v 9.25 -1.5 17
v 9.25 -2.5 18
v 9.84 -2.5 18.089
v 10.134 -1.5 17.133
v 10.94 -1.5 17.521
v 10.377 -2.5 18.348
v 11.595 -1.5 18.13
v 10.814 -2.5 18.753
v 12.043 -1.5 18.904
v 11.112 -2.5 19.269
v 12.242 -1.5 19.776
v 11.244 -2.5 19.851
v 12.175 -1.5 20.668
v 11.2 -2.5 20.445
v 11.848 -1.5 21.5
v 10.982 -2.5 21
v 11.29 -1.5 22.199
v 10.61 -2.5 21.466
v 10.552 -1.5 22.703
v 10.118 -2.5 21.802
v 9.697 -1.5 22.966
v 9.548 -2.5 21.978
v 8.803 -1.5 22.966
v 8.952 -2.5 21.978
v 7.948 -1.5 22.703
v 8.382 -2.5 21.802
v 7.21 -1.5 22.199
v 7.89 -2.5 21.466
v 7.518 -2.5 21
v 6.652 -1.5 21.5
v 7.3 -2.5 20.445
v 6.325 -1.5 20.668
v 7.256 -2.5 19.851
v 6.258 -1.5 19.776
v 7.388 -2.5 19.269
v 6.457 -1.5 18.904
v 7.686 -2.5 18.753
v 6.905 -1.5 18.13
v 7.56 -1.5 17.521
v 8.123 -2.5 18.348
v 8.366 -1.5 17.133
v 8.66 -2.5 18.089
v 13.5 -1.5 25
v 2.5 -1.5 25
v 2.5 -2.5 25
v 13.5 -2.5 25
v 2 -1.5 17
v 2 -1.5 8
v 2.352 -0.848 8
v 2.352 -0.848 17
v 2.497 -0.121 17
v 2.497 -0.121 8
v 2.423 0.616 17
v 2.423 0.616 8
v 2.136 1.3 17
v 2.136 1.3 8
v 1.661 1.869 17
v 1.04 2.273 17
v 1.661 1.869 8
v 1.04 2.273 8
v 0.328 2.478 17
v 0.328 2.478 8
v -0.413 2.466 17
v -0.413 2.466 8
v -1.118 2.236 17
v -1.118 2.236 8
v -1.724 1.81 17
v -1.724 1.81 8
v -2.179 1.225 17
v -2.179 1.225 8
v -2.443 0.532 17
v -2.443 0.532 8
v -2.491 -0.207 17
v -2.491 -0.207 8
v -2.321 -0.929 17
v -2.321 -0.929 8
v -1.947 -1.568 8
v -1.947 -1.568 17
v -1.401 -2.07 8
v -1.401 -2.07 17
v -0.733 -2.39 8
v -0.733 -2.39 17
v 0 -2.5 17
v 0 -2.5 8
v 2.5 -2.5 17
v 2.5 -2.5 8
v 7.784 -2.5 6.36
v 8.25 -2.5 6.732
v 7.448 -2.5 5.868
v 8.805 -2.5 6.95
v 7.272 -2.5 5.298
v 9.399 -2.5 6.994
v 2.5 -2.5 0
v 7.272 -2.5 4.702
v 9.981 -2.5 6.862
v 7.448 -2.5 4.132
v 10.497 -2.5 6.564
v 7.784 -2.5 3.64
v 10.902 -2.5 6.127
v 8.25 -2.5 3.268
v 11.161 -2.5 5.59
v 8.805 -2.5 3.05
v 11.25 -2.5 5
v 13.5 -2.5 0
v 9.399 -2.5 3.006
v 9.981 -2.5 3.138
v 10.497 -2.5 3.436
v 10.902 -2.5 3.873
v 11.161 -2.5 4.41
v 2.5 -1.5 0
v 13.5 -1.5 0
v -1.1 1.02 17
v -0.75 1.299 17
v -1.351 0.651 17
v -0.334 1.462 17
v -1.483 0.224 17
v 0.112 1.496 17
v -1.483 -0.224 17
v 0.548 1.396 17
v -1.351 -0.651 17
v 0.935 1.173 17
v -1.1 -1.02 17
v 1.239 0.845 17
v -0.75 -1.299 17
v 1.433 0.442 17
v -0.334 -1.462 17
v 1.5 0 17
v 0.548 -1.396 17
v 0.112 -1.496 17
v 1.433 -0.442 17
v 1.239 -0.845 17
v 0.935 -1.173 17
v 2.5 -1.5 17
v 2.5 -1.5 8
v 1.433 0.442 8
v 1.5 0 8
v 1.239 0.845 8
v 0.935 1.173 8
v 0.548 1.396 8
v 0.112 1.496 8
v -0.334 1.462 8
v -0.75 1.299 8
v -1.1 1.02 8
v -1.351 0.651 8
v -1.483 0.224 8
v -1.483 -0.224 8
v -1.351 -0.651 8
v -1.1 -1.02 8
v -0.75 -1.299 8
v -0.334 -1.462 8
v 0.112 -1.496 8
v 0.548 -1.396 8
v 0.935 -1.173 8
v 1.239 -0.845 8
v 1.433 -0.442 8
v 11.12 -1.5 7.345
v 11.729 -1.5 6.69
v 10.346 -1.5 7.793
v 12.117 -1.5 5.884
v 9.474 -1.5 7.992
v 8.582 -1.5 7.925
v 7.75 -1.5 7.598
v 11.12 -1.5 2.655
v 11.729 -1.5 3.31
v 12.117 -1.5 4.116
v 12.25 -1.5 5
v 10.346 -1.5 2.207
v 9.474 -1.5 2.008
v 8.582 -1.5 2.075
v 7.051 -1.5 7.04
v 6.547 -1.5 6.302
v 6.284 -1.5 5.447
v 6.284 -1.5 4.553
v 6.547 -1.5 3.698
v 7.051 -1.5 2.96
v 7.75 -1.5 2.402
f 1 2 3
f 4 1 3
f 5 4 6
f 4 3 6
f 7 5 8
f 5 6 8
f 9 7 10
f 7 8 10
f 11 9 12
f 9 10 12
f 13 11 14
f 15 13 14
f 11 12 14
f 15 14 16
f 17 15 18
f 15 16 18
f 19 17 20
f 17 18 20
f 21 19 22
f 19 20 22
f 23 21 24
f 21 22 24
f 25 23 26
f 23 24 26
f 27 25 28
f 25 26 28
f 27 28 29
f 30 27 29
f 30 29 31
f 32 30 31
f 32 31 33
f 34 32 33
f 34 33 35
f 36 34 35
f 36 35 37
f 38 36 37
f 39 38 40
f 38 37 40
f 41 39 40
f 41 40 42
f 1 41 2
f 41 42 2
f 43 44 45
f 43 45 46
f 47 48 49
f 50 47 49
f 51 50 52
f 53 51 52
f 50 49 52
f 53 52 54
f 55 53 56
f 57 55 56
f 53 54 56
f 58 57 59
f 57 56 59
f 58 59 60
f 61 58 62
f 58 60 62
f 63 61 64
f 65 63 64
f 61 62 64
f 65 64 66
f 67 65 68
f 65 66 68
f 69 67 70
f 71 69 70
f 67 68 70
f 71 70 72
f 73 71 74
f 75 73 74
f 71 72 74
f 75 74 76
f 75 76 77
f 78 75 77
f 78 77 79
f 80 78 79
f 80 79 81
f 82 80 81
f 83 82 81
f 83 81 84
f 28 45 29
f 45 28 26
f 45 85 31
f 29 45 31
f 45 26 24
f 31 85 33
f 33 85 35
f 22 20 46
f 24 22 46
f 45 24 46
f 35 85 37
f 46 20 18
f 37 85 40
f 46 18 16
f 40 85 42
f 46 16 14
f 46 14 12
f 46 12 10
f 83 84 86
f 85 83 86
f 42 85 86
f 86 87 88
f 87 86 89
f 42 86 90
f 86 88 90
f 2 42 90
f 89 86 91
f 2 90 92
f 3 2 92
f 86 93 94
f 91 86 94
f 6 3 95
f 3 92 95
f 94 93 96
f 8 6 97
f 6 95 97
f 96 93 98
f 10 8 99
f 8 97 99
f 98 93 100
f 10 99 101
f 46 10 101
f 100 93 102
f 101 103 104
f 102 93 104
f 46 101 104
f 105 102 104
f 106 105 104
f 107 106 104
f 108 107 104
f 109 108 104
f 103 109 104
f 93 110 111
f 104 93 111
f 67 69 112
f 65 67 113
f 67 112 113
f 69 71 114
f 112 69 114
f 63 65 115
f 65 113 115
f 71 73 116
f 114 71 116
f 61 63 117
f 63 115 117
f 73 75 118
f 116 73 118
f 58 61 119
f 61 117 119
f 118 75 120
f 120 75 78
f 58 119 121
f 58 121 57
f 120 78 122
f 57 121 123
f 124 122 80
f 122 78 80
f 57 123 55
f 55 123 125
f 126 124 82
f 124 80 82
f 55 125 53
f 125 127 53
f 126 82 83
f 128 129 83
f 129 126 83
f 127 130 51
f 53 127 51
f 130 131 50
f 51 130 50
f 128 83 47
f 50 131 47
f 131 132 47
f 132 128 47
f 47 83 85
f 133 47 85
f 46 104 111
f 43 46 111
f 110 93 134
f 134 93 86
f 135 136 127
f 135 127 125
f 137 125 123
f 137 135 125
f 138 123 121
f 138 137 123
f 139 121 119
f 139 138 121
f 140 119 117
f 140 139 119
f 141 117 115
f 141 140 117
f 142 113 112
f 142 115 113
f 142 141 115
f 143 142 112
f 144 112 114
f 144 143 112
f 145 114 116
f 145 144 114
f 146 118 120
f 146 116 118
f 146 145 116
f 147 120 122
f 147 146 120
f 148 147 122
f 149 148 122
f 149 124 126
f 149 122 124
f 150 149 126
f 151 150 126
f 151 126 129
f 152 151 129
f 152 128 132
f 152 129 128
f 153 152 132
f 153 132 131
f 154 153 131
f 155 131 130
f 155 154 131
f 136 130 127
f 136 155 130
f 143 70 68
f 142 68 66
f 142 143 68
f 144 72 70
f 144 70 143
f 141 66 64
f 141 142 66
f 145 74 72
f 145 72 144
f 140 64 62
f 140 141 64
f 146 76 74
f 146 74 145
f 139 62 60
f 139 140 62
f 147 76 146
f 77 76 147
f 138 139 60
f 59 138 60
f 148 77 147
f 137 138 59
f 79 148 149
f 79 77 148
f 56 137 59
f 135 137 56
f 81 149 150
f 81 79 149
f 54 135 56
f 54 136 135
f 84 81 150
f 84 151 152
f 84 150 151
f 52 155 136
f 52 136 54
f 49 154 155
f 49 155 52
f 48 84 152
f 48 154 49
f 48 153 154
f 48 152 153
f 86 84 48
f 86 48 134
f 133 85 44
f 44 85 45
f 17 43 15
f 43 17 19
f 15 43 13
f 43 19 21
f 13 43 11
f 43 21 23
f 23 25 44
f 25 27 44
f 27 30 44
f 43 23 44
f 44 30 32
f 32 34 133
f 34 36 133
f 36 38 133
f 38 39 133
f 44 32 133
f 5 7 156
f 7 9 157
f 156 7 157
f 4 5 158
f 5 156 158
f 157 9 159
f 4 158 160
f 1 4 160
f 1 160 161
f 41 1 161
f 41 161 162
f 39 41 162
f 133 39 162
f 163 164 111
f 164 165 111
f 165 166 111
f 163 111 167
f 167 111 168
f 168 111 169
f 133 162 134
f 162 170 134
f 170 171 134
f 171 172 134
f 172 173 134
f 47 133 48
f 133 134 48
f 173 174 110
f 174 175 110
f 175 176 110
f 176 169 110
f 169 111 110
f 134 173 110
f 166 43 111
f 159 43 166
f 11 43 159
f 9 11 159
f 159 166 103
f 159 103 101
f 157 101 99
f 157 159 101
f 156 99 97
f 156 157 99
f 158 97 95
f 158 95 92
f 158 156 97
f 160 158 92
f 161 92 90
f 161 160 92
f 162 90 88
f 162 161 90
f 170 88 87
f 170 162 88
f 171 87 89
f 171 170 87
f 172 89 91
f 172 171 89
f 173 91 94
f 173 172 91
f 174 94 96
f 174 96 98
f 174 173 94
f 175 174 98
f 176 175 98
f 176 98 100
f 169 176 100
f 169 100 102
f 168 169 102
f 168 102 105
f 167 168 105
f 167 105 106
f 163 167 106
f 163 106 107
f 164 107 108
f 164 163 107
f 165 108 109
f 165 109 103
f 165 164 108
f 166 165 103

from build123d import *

# Parameters (mm, degrees)
SKETCH_1_R          = 1.5
EXTRUDE_1_DEPTH     = 25
SKETCH_2_R          = 2
SKETCH_2_W          = 5
SKETCH_2_H          = 8
CUT_EXTRUDE_1_DEPTH = 29.848743474
CHAMFER_1_SIZE      = 1


with BuildPart() as part:
    # 草图1 → 凸台-拉伸1 (new body)
    with BuildSketch(Plane.XY):
        with BuildLine():
            Line((0, -2.5), (13.5, -2.5))
            Line((13.5, -2.5), (13.5, -1.5))
            Line((13.5, -1.5), (2, -1.5))
            ThreePointArc((2, -1.5), (-1.118033989, 2.236067977), (0, -2.5))
        make_face()
        Circle(SKETCH_1_R, mode=Mode.SUBTRACT)
    extrude(amount=EXTRUDE_1_DEPTH)

    # 草图2 → 切除-拉伸1 (cut, through all)
    with BuildSketch(Plane.XZ.offset(2.5)):
        with Locations(Location((9.25, 20, 0), (0, 0, 270))):
            Circle(SKETCH_2_R)
        with Locations((9.25, 5)):
            Circle(SKETCH_2_R)
        with Locations((0, 4)):
            Rectangle(SKETCH_2_W, SKETCH_2_H)
        with Locations((0, 21)):
            Rectangle(SKETCH_2_W, SKETCH_2_H)
    extrude(amount=-CUT_EXTRUDE_1_DEPTH, mode=Mode.SUBTRACT)

    # 倒角1
    chamfer_1_edges = [part.edges().sort_by_distance(p)[0] for p in [
        (7.25, -1.5, 5),
        (9.25, -1.5, 22),
    ]]
    chamfer(chamfer_1_edges, length=CHAMFER_1_SIZE - 0.0001)  # a hair under: the kernel refuses the full size


solid = part.part
